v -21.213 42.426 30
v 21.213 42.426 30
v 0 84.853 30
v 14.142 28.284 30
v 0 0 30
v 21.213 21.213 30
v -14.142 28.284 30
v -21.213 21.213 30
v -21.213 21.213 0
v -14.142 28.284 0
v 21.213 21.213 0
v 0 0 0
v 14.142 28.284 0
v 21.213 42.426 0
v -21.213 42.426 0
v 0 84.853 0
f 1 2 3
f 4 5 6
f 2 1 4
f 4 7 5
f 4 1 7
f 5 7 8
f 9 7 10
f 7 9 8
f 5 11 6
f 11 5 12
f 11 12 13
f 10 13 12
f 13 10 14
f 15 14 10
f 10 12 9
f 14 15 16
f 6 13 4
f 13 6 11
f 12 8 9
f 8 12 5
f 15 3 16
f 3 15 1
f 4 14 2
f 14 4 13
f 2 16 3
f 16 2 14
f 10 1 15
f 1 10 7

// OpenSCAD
rotate([0,-90,0]){
    union(){
        rotate([-45,0,0]) {
            cube([30, 30, 30]);
        }
        scale([1,2,1]) {
            rotate([-45,0,0]) {
                cube([30, 30, 30]);
            }
        }
    }
}
